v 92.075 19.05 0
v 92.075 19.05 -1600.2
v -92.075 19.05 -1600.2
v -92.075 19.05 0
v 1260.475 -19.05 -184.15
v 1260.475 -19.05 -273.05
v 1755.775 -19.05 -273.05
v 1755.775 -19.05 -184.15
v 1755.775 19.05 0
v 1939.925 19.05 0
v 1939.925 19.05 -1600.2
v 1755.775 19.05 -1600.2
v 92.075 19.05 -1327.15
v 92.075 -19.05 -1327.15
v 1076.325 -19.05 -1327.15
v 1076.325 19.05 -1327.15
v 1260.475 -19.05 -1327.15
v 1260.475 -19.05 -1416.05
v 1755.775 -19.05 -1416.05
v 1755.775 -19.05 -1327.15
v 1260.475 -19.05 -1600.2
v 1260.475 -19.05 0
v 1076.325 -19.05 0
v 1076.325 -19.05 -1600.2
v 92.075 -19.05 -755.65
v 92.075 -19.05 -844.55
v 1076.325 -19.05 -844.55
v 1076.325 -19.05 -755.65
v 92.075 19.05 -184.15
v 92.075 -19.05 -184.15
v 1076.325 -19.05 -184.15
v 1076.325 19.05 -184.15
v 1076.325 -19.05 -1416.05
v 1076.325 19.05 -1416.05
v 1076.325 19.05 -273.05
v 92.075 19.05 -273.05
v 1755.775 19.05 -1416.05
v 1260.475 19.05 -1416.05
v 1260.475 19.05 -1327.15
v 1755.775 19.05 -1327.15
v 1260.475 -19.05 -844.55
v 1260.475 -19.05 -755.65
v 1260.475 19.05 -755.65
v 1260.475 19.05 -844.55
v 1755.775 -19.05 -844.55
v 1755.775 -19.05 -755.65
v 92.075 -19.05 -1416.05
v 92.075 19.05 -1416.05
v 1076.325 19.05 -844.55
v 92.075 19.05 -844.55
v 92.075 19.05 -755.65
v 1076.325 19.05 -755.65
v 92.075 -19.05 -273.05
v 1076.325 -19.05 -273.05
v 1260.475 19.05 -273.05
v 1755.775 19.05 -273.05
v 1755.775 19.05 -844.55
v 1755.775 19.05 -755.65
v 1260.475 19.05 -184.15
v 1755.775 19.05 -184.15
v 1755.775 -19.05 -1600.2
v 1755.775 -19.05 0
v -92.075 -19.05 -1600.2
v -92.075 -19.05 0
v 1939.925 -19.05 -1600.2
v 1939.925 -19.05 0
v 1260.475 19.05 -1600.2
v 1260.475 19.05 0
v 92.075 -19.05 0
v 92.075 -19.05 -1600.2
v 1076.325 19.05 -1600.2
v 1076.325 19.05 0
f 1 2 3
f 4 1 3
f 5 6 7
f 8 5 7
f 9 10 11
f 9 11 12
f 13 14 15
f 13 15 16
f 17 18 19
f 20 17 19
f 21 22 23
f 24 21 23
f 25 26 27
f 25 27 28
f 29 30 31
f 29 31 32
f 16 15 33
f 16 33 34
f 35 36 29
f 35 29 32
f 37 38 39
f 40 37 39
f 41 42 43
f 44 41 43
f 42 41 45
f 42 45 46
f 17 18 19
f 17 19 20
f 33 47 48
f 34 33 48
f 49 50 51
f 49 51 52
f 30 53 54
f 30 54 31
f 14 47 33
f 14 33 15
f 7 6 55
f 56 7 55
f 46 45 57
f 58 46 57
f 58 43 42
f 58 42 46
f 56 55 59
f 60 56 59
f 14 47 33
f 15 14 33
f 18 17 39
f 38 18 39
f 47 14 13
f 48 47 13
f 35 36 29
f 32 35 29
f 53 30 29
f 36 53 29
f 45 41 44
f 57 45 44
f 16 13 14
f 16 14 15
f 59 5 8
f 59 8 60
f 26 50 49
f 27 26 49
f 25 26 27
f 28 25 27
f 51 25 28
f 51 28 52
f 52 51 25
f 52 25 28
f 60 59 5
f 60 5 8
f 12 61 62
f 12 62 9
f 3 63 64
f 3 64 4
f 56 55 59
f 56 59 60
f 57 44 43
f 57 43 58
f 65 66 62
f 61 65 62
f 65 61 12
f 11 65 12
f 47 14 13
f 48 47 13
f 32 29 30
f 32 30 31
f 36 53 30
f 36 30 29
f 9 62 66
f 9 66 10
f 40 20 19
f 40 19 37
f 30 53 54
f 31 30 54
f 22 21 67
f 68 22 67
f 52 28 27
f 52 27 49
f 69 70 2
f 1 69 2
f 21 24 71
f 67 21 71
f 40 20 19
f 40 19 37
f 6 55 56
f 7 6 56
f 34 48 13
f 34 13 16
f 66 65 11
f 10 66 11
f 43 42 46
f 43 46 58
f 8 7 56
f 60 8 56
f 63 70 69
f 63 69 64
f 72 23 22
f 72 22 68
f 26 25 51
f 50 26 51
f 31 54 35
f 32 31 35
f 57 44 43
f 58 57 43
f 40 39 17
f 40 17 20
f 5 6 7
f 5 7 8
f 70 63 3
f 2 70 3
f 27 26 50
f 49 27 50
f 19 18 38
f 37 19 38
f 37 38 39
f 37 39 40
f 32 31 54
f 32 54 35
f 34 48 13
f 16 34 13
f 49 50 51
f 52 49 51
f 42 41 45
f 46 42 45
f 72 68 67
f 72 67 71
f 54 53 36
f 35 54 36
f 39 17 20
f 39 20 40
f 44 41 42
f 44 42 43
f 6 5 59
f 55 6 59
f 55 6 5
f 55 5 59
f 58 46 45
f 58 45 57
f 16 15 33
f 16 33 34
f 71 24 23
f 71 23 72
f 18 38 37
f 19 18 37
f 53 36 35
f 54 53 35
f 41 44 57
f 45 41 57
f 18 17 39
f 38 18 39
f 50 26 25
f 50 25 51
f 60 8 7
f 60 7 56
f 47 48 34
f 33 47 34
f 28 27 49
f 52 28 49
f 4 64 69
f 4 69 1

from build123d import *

# Parameters (mm, degrees)
SKETCH112_W                            = 38.1
SKETCH112_H                            = 88.9
WOODEN_STUD_CONFIGURED_2_X_4_2_DEPTH   = 1168.4
SKETCH112_ON_SEGMENT_2_W               = 38.1
SKETCH112_ON_SEGMENT_2_H               = 88.9
WOODEN_STUD_CONFIGURED_2_X_4_2_2_DEPTH = 1168.4
SKETCH112_ON_SEGMENT_3_W               = 38.1
SKETCH112_ON_SEGMENT_3_H               = 88.9
WOODEN_STUD_CONFIGURED_2_X_4_2_3_DEPTH = 1168.4
SKETCH112_ON_SEGMENT_4_W               = 38.1
SKETCH112_ON_SEGMENT_4_H               = 88.9
WOODEN_STUD_CONFIGURED_2_X_4_2_4_DEPTH = 679.45
SKETCH112_ON_SEGMENT_5_W               = 38.1
SKETCH112_ON_SEGMENT_5_H               = 88.9
WOODEN_STUD_CONFIGURED_2_X_4_2_5_DEPTH = 679.45
SKETCH112_ON_SEGMENT_6_W               = 38.1
SKETCH112_ON_SEGMENT_6_H               = 88.9
WOODEN_STUD_CONFIGURED_2_X_4_2_6_DEPTH = 679.45
SKETCH114_W                            = 38.1
SKETCH114_H                            = 184.15
WOODEN_STUD_CONFIGURED_2_X_8_3_DEPTH   = 1600.2
SKETCH114_ON_SEGMENT_2_W               = 38.1
SKETCH114_ON_SEGMENT_2_H               = 184.15
WOODEN_STUD_CONFIGURED_2_X_8_3_2_DEPTH = 1600.2
SKETCH114_ON_SEGMENT_3_W               = 38.1
SKETCH114_ON_SEGMENT_3_H               = 184.15
WOODEN_STUD_CONFIGURED_2_X_8_3_3_DEPTH = 1600.2
TRIM_EXTEND3_START                     = 1168.4
TRIM_EXTEND3_OUTLINE_W                 = 38.1
TRIM_EXTEND3_OUTLINE_H                 = 88.9
TRIM_EXTEND3_DEPTH                     = 92.075
TRIM_EXTEND3_START_2                   = 1755.775
TRIM_EXTEND3_2_OUTLINE_W               = 38.1
TRIM_EXTEND3_2_OUTLINE_H               = 88.9
TRIM_EXTEND3_2_DEPTH                   = 92.075
TRIM_EXTEND3_3_OUTLINE_W               = 38.1
TRIM_EXTEND3_3_OUTLINE_H               = 88.9
TRIM_EXTEND3_3_DEPTH                   = 92.075
TRIM_EXTEND3_START_3                   = 1076.325
TRIM_EXTEND3_4_OUTLINE_W               = 38.1
TRIM_EXTEND3_4_OUTLINE_H               = 88.9
TRIM_EXTEND3_4_DEPTH                   = 92.075
TRIM_EXTEND3_5_OUTLINE_W               = 38.1
TRIM_EXTEND3_5_OUTLINE_H               = 88.9
TRIM_EXTEND3_5_DEPTH                   = 92.075
TRIM_EXTEND3_6_OUTLINE_W               = 38.1
TRIM_EXTEND3_6_OUTLINE_H               = 88.9
TRIM_EXTEND3_6_DEPTH                   = 92.075
TRIM_EXTEND3_7_OUTLINE_W               = 38.1
TRIM_EXTEND3_7_OUTLINE_H               = 88.9
TRIM_EXTEND3_7_DEPTH                   = 92.075
TRIM_EXTEND3_8_OUTLINE_W               = 38.1
TRIM_EXTEND3_8_OUTLINE_H               = 88.9
TRIM_EXTEND3_8_DEPTH                   = 92.075
TRIM_EXTEND3_9_OUTLINE_W               = 38.1
TRIM_EXTEND3_9_OUTLINE_H               = 88.9
TRIM_EXTEND3_9_DEPTH                   = 92.075
TRIM_EXTEND3_10_OUTLINE_W              = 38.1
TRIM_EXTEND3_10_OUTLINE_H              = 88.9
TRIM_EXTEND3_10_DEPTH                  = 92.075
TRIM_EXTEND3_11_OUTLINE_W              = 38.1
TRIM_EXTEND3_11_OUTLINE_H              = 88.9
TRIM_EXTEND3_11_DEPTH                  = 92.075
TRIM_EXTEND3_12_OUTLINE_W              = 38.1
TRIM_EXTEND3_12_OUTLINE_H              = 88.9
TRIM_EXTEND3_12_DEPTH                  = 92.075
TRIM_EXTEND3_START_4                   = -273.05
TRIM_EXTEND3_13_OUTLINE_W              = 495.3
TRIM_EXTEND3_13_OUTLINE_H              = 38.1
TRIM_EXTEND3_13_DEPTH                  = 88.9
TRIM_EXTEND3_14_OUTLINE_W              = 984.25
TRIM_EXTEND3_14_OUTLINE_H              = 38.1
TRIM_EXTEND3_14_DEPTH                  = 88.9
TRIM_EXTEND3_START_5                   = -844.55
TRIM_EXTEND3_15_OUTLINE_W              = 495.3
TRIM_EXTEND3_15_OUTLINE_H              = 38.1
TRIM_EXTEND3_15_DEPTH                  = 88.9
TRIM_EXTEND3_16_OUTLINE_W              = 984.25
TRIM_EXTEND3_16_OUTLINE_H              = 38.1
TRIM_EXTEND3_16_DEPTH                  = 88.9
TRIM_EXTEND3_START_6                   = -1416.05
TRIM_EXTEND3_17_OUTLINE_W              = 495.3
TRIM_EXTEND3_17_OUTLINE_H              = 38.1
TRIM_EXTEND3_17_DEPTH                  = 88.9
TRIM_EXTEND3_18_OUTLINE_W              = 984.25
TRIM_EXTEND3_18_OUTLINE_H              = 38.1
TRIM_EXTEND3_18_DEPTH                  = 88.9


# Read off the part's stored shape, not the designer's step: Trim/Extend3
with BuildPart() as part:
    # Sketch112 → Wooden-stud - configured 2 X 4(2) (new body)
    with BuildSketch(Plane(origin=(0, 0, -228.6), x_dir=(0, 1, 0), z_dir=(1, 0, 0))):
        Rectangle(SKETCH112_W, SKETCH112_H)
    extrude(amount=WOODEN_STUD_CONFIGURED_2_X_4_2_DEPTH)

    # Trim_Extend3 3 outline → Trim_Extend3 3 (cut)
    with BuildSketch(Plane.YZ):
        with Locations((0, -228.6)):
            Rectangle(TRIM_EXTEND3_3_OUTLINE_W, TRIM_EXTEND3_3_OUTLINE_H)
    extrude(amount=TRIM_EXTEND3_3_DEPTH, mode=Mode.SUBTRACT)

    # Trim_Extend3 4 outline → Trim_Extend3 4 (cut)
    with BuildSketch(Plane.YZ.offset(TRIM_EXTEND3_START_3)):
        with Locations((0, -228.6)):
            Rectangle(TRIM_EXTEND3_4_OUTLINE_W, TRIM_EXTEND3_4_OUTLINE_H)
    extrude(amount=TRIM_EXTEND3_4_DEPTH, mode=Mode.SUBTRACT)


with BuildPart() as body_2:
    # Sketch112 on segment 2 (carried to segment 2) → Wooden-stud - configured 2 X 4_2 2 (new body)
    with BuildSketch(Plane(origin=(0, 0, -800.1), x_dir=(0, 1, 0), z_dir=(1, 0, 0))):
        Rectangle(SKETCH112_ON_SEGMENT_2_W, SKETCH112_ON_SEGMENT_2_H)
    extrude(amount=WOODEN_STUD_CONFIGURED_2_X_4_2_2_DEPTH)

    # Trim_Extend3 7 outline → Trim_Extend3 7 (cut)
    with BuildSketch(Plane.YZ):
        with Locations((0, -800.1)):
            Rectangle(TRIM_EXTEND3_7_OUTLINE_W, TRIM_EXTEND3_7_OUTLINE_H)
    extrude(amount=TRIM_EXTEND3_7_DEPTH, mode=Mode.SUBTRACT)

    # Trim_Extend3 8 outline → Trim_Extend3 8 (cut)
    with BuildSketch(Plane.YZ.offset(TRIM_EXTEND3_START_3)):
        with Locations((0, -800.1)):
            Rectangle(TRIM_EXTEND3_8_OUTLINE_W, TRIM_EXTEND3_8_OUTLINE_H)
    extrude(amount=TRIM_EXTEND3_8_DEPTH, mode=Mode.SUBTRACT)


with BuildPart() as body_3:
    # Sketch112 on segment 3 (carried to segment 3) → Wooden-stud - configured 2 X 4_2 3 (new body)
    with BuildSketch(Plane(origin=(0, 0, -1371.6), x_dir=(0, 1, 0), z_dir=(1, 0, 0))):
        Rectangle(SKETCH112_ON_SEGMENT_3_W, SKETCH112_ON_SEGMENT_3_H)
    extrude(amount=WOODEN_STUD_CONFIGURED_2_X_4_2_3_DEPTH)

    # Trim_Extend3 11 outline → Trim_Extend3 11 (cut)
    with BuildSketch(Plane.YZ):
        with Locations((0, -1371.6)):
            Rectangle(TRIM_EXTEND3_11_OUTLINE_W, TRIM_EXTEND3_11_OUTLINE_H)
    extrude(amount=TRIM_EXTEND3_11_DEPTH, mode=Mode.SUBTRACT)

    # Trim_Extend3 12 outline → Trim_Extend3 12 (cut)
    with BuildSketch(Plane.YZ.offset(TRIM_EXTEND3_START_3)):
        with Locations((0, -1371.6)):
            Rectangle(TRIM_EXTEND3_12_OUTLINE_W, TRIM_EXTEND3_12_OUTLINE_H)
    extrude(amount=TRIM_EXTEND3_12_DEPTH, mode=Mode.SUBTRACT)


with BuildPart() as body_4:
    # Sketch112 on segment 4 (carried to segment 4) → Wooden-stud - configured 2 X 4_2 4 (new body)
    with BuildSketch(Plane(origin=(1168.4, 0, -1371.6), x_dir=(0, 1, 0), z_dir=(1, 0, 0))):
        Rectangle(SKETCH112_ON_SEGMENT_4_W, SKETCH112_ON_SEGMENT_4_H)
    extrude(amount=WOODEN_STUD_CONFIGURED_2_X_4_2_4_DEPTH)

    # Trim_Extend3 9 outline → Trim_Extend3 9 (cut)
    with BuildSketch(Plane.YZ.offset(TRIM_EXTEND3_START)):
        with Locations((0, -1371.6)):
            Rectangle(TRIM_EXTEND3_9_OUTLINE_W, TRIM_EXTEND3_9_OUTLINE_H)
    extrude(amount=TRIM_EXTEND3_9_DEPTH, mode=Mode.SUBTRACT)

    # Trim_Extend3 10 outline → Trim_Extend3 10 (cut)
    with BuildSketch(Plane.YZ.offset(TRIM_EXTEND3_START_2)):
        with Locations((0, -1371.6)):
            Rectangle(TRIM_EXTEND3_10_OUTLINE_W, TRIM_EXTEND3_10_OUTLINE_H)
    extrude(amount=TRIM_EXTEND3_10_DEPTH, mode=Mode.SUBTRACT)


with BuildPart() as body_5:
    # Sketch112 on segment 5 (carried to segment 5) → Wooden-stud - configured 2 X 4_2 5 (new body)
    with BuildSketch(Plane(origin=(1168.4, 0, -800.1), x_dir=(0, 1, 0), z_dir=(1, 0, 0))):
        Rectangle(SKETCH112_ON_SEGMENT_5_W, SKETCH112_ON_SEGMENT_5_H)
    extrude(amount=WOODEN_STUD_CONFIGURED_2_X_4_2_5_DEPTH)

    # Trim_Extend3 5 outline → Trim_Extend3 5 (cut)
    with BuildSketch(Plane.YZ.offset(TRIM_EXTEND3_START)):
        with Locations((0, -800.1)):
            Rectangle(TRIM_EXTEND3_5_OUTLINE_W, TRIM_EXTEND3_5_OUTLINE_H)
    extrude(amount=TRIM_EXTEND3_5_DEPTH, mode=Mode.SUBTRACT)

    # Trim_Extend3 6 outline → Trim_Extend3 6 (cut)
    with BuildSketch(Plane.YZ.offset(TRIM_EXTEND3_START_2)):
        with Locations((0, -800.1)):
            Rectangle(TRIM_EXTEND3_6_OUTLINE_W, TRIM_EXTEND3_6_OUTLINE_H)
    extrude(amount=TRIM_EXTEND3_6_DEPTH, mode=Mode.SUBTRACT)


with BuildPart() as body_6:
    # Sketch112 on segment 6 (carried to segment 6) → Wooden-stud - configured 2 X 4_2 6 (new body)
    with BuildSketch(Plane(origin=(1168.4, 0, -228.6), x_dir=(0, 1, 0), z_dir=(1, 0, 0))):
        Rectangle(SKETCH112_ON_SEGMENT_6_W, SKETCH112_ON_SEGMENT_6_H)
    extrude(amount=WOODEN_STUD_CONFIGURED_2_X_4_2_6_DEPTH)

    # Trim/Extend3 outline → Trim/Extend3 (cut)
    with BuildSketch(Plane.YZ.offset(TRIM_EXTEND3_START)):
        with Locations((0, -228.6)):
            Rectangle(TRIM_EXTEND3_OUTLINE_W, TRIM_EXTEND3_OUTLINE_H)
    extrude(amount=TRIM_EXTEND3_DEPTH, mode=Mode.SUBTRACT)

    # Trim_Extend3 2 outline → Trim_Extend3 2 (cut)
    with BuildSketch(Plane.YZ.offset(TRIM_EXTEND3_START_2)):
        with Locations((0, -228.6)):
            Rectangle(TRIM_EXTEND3_2_OUTLINE_W, TRIM_EXTEND3_2_OUTLINE_H)
    extrude(amount=TRIM_EXTEND3_2_DEPTH, mode=Mode.SUBTRACT)


with BuildPart() as body_7:
    # Sketch114 → Wooden-stud - configured 2 X 8(3) (new body)
    with BuildSketch(Plane(origin=(0, 0, -1600.2), x_dir=(0, 1, 0), z_dir=(0, 0, 1))):
        Rectangle(SKETCH114_W, SKETCH114_H)
    extrude(amount=WOODEN_STUD_CONFIGURED_2_X_8_3_DEPTH)


with BuildPart() as body_8:
    # Sketch114 on segment 2 (carried to segment 2) → Wooden-stud - configured 2 X 8_3 2 (new body)
    with BuildSketch(Plane(origin=(1168.4, 0, -1600.2), x_dir=(0, 1, 0), z_dir=(0, 0, 1))):
        Rectangle(SKETCH114_ON_SEGMENT_2_W, SKETCH114_ON_SEGMENT_2_H)
    extrude(amount=WOODEN_STUD_CONFIGURED_2_X_8_3_2_DEPTH)


with BuildPart() as body_9:
    # Sketch114 on segment 3 (carried to segment 3) → Wooden-stud - configured 2 X 8_3 3 (new body)
    with BuildSketch(Plane(origin=(1847.85, 0, -1600.2), x_dir=(0, 1, 0), z_dir=(0, 0, 1))):
        Rectangle(SKETCH114_ON_SEGMENT_3_W, SKETCH114_ON_SEGMENT_3_H)
    extrude(amount=WOODEN_STUD_CONFIGURED_2_X_8_3_3_DEPTH)


with BuildPart() as body_10:
    # Trim_Extend3 13 outline → Trim_Extend3 13 (new body)
    with BuildSketch(Plane.XY.offset(TRIM_EXTEND3_START_4)):
        with Locations((1508.125, 0)):
            Rectangle(TRIM_EXTEND3_13_OUTLINE_W, TRIM_EXTEND3_13_OUTLINE_H)
    extrude(amount=TRIM_EXTEND3_13_DEPTH)


with BuildPart() as body_11:
    # Trim_Extend3 14 outline → Trim_Extend3 14 (new body)
    with BuildSketch(Plane.XY.offset(TRIM_EXTEND3_START_4)):
        with Locations((584.2, 0)):
            Rectangle(TRIM_EXTEND3_14_OUTLINE_W, TRIM_EXTEND3_14_OUTLINE_H)
    extrude(amount=TRIM_EXTEND3_14_DEPTH)


with BuildPart() as body_12:
    # Trim_Extend3 15 outline → Trim_Extend3 15 (new body)
    with BuildSketch(Plane.XY.offset(TRIM_EXTEND3_START_5)):
        with Locations((1508.125, 0)):
            Rectangle(TRIM_EXTEND3_15_OUTLINE_W, TRIM_EXTEND3_15_OUTLINE_H)
    extrude(amount=TRIM_EXTEND3_15_DEPTH)


with BuildPart() as body_13:
    # Trim_Extend3 16 outline → Trim_Extend3 16 (new body)
    with BuildSketch(Plane.XY.offset(TRIM_EXTEND3_START_5)):
        with Locations((584.2, 0)):
            Rectangle(TRIM_EXTEND3_16_OUTLINE_W, TRIM_EXTEND3_16_OUTLINE_H)
    extrude(amount=TRIM_EXTEND3_16_DEPTH)


with BuildPart() as body_14:
    # Trim_Extend3 17 outline → Trim_Extend3 17 (new body)
    with BuildSketch(Plane.XY.offset(TRIM_EXTEND3_START_6)):
        with Locations((1508.125, 0)):
            Rectangle(TRIM_EXTEND3_17_OUTLINE_W, TRIM_EXTEND3_17_OUTLINE_H)
    extrude(amount=TRIM_EXTEND3_17_DEPTH)


with BuildPart() as body_15:
    # Trim_Extend3 18 outline → Trim_Extend3 18 (new body)
    with BuildSketch(Plane.XY.offset(TRIM_EXTEND3_START_6)):
        with Locations((584.2, 0)):
            Rectangle(TRIM_EXTEND3_18_OUTLINE_W, TRIM_EXTEND3_18_OUTLINE_H)
    extrude(amount=TRIM_EXTEND3_18_DEPTH)


solid = Compound([part.part, body_2.part, body_3.part, body_4.part, body_5.part, body_6.part, body_7.part, body_8.part, body_9.part, body_10.part, body_11.part, body_12.part, body_13.part, body_14.part, body_15.part])
